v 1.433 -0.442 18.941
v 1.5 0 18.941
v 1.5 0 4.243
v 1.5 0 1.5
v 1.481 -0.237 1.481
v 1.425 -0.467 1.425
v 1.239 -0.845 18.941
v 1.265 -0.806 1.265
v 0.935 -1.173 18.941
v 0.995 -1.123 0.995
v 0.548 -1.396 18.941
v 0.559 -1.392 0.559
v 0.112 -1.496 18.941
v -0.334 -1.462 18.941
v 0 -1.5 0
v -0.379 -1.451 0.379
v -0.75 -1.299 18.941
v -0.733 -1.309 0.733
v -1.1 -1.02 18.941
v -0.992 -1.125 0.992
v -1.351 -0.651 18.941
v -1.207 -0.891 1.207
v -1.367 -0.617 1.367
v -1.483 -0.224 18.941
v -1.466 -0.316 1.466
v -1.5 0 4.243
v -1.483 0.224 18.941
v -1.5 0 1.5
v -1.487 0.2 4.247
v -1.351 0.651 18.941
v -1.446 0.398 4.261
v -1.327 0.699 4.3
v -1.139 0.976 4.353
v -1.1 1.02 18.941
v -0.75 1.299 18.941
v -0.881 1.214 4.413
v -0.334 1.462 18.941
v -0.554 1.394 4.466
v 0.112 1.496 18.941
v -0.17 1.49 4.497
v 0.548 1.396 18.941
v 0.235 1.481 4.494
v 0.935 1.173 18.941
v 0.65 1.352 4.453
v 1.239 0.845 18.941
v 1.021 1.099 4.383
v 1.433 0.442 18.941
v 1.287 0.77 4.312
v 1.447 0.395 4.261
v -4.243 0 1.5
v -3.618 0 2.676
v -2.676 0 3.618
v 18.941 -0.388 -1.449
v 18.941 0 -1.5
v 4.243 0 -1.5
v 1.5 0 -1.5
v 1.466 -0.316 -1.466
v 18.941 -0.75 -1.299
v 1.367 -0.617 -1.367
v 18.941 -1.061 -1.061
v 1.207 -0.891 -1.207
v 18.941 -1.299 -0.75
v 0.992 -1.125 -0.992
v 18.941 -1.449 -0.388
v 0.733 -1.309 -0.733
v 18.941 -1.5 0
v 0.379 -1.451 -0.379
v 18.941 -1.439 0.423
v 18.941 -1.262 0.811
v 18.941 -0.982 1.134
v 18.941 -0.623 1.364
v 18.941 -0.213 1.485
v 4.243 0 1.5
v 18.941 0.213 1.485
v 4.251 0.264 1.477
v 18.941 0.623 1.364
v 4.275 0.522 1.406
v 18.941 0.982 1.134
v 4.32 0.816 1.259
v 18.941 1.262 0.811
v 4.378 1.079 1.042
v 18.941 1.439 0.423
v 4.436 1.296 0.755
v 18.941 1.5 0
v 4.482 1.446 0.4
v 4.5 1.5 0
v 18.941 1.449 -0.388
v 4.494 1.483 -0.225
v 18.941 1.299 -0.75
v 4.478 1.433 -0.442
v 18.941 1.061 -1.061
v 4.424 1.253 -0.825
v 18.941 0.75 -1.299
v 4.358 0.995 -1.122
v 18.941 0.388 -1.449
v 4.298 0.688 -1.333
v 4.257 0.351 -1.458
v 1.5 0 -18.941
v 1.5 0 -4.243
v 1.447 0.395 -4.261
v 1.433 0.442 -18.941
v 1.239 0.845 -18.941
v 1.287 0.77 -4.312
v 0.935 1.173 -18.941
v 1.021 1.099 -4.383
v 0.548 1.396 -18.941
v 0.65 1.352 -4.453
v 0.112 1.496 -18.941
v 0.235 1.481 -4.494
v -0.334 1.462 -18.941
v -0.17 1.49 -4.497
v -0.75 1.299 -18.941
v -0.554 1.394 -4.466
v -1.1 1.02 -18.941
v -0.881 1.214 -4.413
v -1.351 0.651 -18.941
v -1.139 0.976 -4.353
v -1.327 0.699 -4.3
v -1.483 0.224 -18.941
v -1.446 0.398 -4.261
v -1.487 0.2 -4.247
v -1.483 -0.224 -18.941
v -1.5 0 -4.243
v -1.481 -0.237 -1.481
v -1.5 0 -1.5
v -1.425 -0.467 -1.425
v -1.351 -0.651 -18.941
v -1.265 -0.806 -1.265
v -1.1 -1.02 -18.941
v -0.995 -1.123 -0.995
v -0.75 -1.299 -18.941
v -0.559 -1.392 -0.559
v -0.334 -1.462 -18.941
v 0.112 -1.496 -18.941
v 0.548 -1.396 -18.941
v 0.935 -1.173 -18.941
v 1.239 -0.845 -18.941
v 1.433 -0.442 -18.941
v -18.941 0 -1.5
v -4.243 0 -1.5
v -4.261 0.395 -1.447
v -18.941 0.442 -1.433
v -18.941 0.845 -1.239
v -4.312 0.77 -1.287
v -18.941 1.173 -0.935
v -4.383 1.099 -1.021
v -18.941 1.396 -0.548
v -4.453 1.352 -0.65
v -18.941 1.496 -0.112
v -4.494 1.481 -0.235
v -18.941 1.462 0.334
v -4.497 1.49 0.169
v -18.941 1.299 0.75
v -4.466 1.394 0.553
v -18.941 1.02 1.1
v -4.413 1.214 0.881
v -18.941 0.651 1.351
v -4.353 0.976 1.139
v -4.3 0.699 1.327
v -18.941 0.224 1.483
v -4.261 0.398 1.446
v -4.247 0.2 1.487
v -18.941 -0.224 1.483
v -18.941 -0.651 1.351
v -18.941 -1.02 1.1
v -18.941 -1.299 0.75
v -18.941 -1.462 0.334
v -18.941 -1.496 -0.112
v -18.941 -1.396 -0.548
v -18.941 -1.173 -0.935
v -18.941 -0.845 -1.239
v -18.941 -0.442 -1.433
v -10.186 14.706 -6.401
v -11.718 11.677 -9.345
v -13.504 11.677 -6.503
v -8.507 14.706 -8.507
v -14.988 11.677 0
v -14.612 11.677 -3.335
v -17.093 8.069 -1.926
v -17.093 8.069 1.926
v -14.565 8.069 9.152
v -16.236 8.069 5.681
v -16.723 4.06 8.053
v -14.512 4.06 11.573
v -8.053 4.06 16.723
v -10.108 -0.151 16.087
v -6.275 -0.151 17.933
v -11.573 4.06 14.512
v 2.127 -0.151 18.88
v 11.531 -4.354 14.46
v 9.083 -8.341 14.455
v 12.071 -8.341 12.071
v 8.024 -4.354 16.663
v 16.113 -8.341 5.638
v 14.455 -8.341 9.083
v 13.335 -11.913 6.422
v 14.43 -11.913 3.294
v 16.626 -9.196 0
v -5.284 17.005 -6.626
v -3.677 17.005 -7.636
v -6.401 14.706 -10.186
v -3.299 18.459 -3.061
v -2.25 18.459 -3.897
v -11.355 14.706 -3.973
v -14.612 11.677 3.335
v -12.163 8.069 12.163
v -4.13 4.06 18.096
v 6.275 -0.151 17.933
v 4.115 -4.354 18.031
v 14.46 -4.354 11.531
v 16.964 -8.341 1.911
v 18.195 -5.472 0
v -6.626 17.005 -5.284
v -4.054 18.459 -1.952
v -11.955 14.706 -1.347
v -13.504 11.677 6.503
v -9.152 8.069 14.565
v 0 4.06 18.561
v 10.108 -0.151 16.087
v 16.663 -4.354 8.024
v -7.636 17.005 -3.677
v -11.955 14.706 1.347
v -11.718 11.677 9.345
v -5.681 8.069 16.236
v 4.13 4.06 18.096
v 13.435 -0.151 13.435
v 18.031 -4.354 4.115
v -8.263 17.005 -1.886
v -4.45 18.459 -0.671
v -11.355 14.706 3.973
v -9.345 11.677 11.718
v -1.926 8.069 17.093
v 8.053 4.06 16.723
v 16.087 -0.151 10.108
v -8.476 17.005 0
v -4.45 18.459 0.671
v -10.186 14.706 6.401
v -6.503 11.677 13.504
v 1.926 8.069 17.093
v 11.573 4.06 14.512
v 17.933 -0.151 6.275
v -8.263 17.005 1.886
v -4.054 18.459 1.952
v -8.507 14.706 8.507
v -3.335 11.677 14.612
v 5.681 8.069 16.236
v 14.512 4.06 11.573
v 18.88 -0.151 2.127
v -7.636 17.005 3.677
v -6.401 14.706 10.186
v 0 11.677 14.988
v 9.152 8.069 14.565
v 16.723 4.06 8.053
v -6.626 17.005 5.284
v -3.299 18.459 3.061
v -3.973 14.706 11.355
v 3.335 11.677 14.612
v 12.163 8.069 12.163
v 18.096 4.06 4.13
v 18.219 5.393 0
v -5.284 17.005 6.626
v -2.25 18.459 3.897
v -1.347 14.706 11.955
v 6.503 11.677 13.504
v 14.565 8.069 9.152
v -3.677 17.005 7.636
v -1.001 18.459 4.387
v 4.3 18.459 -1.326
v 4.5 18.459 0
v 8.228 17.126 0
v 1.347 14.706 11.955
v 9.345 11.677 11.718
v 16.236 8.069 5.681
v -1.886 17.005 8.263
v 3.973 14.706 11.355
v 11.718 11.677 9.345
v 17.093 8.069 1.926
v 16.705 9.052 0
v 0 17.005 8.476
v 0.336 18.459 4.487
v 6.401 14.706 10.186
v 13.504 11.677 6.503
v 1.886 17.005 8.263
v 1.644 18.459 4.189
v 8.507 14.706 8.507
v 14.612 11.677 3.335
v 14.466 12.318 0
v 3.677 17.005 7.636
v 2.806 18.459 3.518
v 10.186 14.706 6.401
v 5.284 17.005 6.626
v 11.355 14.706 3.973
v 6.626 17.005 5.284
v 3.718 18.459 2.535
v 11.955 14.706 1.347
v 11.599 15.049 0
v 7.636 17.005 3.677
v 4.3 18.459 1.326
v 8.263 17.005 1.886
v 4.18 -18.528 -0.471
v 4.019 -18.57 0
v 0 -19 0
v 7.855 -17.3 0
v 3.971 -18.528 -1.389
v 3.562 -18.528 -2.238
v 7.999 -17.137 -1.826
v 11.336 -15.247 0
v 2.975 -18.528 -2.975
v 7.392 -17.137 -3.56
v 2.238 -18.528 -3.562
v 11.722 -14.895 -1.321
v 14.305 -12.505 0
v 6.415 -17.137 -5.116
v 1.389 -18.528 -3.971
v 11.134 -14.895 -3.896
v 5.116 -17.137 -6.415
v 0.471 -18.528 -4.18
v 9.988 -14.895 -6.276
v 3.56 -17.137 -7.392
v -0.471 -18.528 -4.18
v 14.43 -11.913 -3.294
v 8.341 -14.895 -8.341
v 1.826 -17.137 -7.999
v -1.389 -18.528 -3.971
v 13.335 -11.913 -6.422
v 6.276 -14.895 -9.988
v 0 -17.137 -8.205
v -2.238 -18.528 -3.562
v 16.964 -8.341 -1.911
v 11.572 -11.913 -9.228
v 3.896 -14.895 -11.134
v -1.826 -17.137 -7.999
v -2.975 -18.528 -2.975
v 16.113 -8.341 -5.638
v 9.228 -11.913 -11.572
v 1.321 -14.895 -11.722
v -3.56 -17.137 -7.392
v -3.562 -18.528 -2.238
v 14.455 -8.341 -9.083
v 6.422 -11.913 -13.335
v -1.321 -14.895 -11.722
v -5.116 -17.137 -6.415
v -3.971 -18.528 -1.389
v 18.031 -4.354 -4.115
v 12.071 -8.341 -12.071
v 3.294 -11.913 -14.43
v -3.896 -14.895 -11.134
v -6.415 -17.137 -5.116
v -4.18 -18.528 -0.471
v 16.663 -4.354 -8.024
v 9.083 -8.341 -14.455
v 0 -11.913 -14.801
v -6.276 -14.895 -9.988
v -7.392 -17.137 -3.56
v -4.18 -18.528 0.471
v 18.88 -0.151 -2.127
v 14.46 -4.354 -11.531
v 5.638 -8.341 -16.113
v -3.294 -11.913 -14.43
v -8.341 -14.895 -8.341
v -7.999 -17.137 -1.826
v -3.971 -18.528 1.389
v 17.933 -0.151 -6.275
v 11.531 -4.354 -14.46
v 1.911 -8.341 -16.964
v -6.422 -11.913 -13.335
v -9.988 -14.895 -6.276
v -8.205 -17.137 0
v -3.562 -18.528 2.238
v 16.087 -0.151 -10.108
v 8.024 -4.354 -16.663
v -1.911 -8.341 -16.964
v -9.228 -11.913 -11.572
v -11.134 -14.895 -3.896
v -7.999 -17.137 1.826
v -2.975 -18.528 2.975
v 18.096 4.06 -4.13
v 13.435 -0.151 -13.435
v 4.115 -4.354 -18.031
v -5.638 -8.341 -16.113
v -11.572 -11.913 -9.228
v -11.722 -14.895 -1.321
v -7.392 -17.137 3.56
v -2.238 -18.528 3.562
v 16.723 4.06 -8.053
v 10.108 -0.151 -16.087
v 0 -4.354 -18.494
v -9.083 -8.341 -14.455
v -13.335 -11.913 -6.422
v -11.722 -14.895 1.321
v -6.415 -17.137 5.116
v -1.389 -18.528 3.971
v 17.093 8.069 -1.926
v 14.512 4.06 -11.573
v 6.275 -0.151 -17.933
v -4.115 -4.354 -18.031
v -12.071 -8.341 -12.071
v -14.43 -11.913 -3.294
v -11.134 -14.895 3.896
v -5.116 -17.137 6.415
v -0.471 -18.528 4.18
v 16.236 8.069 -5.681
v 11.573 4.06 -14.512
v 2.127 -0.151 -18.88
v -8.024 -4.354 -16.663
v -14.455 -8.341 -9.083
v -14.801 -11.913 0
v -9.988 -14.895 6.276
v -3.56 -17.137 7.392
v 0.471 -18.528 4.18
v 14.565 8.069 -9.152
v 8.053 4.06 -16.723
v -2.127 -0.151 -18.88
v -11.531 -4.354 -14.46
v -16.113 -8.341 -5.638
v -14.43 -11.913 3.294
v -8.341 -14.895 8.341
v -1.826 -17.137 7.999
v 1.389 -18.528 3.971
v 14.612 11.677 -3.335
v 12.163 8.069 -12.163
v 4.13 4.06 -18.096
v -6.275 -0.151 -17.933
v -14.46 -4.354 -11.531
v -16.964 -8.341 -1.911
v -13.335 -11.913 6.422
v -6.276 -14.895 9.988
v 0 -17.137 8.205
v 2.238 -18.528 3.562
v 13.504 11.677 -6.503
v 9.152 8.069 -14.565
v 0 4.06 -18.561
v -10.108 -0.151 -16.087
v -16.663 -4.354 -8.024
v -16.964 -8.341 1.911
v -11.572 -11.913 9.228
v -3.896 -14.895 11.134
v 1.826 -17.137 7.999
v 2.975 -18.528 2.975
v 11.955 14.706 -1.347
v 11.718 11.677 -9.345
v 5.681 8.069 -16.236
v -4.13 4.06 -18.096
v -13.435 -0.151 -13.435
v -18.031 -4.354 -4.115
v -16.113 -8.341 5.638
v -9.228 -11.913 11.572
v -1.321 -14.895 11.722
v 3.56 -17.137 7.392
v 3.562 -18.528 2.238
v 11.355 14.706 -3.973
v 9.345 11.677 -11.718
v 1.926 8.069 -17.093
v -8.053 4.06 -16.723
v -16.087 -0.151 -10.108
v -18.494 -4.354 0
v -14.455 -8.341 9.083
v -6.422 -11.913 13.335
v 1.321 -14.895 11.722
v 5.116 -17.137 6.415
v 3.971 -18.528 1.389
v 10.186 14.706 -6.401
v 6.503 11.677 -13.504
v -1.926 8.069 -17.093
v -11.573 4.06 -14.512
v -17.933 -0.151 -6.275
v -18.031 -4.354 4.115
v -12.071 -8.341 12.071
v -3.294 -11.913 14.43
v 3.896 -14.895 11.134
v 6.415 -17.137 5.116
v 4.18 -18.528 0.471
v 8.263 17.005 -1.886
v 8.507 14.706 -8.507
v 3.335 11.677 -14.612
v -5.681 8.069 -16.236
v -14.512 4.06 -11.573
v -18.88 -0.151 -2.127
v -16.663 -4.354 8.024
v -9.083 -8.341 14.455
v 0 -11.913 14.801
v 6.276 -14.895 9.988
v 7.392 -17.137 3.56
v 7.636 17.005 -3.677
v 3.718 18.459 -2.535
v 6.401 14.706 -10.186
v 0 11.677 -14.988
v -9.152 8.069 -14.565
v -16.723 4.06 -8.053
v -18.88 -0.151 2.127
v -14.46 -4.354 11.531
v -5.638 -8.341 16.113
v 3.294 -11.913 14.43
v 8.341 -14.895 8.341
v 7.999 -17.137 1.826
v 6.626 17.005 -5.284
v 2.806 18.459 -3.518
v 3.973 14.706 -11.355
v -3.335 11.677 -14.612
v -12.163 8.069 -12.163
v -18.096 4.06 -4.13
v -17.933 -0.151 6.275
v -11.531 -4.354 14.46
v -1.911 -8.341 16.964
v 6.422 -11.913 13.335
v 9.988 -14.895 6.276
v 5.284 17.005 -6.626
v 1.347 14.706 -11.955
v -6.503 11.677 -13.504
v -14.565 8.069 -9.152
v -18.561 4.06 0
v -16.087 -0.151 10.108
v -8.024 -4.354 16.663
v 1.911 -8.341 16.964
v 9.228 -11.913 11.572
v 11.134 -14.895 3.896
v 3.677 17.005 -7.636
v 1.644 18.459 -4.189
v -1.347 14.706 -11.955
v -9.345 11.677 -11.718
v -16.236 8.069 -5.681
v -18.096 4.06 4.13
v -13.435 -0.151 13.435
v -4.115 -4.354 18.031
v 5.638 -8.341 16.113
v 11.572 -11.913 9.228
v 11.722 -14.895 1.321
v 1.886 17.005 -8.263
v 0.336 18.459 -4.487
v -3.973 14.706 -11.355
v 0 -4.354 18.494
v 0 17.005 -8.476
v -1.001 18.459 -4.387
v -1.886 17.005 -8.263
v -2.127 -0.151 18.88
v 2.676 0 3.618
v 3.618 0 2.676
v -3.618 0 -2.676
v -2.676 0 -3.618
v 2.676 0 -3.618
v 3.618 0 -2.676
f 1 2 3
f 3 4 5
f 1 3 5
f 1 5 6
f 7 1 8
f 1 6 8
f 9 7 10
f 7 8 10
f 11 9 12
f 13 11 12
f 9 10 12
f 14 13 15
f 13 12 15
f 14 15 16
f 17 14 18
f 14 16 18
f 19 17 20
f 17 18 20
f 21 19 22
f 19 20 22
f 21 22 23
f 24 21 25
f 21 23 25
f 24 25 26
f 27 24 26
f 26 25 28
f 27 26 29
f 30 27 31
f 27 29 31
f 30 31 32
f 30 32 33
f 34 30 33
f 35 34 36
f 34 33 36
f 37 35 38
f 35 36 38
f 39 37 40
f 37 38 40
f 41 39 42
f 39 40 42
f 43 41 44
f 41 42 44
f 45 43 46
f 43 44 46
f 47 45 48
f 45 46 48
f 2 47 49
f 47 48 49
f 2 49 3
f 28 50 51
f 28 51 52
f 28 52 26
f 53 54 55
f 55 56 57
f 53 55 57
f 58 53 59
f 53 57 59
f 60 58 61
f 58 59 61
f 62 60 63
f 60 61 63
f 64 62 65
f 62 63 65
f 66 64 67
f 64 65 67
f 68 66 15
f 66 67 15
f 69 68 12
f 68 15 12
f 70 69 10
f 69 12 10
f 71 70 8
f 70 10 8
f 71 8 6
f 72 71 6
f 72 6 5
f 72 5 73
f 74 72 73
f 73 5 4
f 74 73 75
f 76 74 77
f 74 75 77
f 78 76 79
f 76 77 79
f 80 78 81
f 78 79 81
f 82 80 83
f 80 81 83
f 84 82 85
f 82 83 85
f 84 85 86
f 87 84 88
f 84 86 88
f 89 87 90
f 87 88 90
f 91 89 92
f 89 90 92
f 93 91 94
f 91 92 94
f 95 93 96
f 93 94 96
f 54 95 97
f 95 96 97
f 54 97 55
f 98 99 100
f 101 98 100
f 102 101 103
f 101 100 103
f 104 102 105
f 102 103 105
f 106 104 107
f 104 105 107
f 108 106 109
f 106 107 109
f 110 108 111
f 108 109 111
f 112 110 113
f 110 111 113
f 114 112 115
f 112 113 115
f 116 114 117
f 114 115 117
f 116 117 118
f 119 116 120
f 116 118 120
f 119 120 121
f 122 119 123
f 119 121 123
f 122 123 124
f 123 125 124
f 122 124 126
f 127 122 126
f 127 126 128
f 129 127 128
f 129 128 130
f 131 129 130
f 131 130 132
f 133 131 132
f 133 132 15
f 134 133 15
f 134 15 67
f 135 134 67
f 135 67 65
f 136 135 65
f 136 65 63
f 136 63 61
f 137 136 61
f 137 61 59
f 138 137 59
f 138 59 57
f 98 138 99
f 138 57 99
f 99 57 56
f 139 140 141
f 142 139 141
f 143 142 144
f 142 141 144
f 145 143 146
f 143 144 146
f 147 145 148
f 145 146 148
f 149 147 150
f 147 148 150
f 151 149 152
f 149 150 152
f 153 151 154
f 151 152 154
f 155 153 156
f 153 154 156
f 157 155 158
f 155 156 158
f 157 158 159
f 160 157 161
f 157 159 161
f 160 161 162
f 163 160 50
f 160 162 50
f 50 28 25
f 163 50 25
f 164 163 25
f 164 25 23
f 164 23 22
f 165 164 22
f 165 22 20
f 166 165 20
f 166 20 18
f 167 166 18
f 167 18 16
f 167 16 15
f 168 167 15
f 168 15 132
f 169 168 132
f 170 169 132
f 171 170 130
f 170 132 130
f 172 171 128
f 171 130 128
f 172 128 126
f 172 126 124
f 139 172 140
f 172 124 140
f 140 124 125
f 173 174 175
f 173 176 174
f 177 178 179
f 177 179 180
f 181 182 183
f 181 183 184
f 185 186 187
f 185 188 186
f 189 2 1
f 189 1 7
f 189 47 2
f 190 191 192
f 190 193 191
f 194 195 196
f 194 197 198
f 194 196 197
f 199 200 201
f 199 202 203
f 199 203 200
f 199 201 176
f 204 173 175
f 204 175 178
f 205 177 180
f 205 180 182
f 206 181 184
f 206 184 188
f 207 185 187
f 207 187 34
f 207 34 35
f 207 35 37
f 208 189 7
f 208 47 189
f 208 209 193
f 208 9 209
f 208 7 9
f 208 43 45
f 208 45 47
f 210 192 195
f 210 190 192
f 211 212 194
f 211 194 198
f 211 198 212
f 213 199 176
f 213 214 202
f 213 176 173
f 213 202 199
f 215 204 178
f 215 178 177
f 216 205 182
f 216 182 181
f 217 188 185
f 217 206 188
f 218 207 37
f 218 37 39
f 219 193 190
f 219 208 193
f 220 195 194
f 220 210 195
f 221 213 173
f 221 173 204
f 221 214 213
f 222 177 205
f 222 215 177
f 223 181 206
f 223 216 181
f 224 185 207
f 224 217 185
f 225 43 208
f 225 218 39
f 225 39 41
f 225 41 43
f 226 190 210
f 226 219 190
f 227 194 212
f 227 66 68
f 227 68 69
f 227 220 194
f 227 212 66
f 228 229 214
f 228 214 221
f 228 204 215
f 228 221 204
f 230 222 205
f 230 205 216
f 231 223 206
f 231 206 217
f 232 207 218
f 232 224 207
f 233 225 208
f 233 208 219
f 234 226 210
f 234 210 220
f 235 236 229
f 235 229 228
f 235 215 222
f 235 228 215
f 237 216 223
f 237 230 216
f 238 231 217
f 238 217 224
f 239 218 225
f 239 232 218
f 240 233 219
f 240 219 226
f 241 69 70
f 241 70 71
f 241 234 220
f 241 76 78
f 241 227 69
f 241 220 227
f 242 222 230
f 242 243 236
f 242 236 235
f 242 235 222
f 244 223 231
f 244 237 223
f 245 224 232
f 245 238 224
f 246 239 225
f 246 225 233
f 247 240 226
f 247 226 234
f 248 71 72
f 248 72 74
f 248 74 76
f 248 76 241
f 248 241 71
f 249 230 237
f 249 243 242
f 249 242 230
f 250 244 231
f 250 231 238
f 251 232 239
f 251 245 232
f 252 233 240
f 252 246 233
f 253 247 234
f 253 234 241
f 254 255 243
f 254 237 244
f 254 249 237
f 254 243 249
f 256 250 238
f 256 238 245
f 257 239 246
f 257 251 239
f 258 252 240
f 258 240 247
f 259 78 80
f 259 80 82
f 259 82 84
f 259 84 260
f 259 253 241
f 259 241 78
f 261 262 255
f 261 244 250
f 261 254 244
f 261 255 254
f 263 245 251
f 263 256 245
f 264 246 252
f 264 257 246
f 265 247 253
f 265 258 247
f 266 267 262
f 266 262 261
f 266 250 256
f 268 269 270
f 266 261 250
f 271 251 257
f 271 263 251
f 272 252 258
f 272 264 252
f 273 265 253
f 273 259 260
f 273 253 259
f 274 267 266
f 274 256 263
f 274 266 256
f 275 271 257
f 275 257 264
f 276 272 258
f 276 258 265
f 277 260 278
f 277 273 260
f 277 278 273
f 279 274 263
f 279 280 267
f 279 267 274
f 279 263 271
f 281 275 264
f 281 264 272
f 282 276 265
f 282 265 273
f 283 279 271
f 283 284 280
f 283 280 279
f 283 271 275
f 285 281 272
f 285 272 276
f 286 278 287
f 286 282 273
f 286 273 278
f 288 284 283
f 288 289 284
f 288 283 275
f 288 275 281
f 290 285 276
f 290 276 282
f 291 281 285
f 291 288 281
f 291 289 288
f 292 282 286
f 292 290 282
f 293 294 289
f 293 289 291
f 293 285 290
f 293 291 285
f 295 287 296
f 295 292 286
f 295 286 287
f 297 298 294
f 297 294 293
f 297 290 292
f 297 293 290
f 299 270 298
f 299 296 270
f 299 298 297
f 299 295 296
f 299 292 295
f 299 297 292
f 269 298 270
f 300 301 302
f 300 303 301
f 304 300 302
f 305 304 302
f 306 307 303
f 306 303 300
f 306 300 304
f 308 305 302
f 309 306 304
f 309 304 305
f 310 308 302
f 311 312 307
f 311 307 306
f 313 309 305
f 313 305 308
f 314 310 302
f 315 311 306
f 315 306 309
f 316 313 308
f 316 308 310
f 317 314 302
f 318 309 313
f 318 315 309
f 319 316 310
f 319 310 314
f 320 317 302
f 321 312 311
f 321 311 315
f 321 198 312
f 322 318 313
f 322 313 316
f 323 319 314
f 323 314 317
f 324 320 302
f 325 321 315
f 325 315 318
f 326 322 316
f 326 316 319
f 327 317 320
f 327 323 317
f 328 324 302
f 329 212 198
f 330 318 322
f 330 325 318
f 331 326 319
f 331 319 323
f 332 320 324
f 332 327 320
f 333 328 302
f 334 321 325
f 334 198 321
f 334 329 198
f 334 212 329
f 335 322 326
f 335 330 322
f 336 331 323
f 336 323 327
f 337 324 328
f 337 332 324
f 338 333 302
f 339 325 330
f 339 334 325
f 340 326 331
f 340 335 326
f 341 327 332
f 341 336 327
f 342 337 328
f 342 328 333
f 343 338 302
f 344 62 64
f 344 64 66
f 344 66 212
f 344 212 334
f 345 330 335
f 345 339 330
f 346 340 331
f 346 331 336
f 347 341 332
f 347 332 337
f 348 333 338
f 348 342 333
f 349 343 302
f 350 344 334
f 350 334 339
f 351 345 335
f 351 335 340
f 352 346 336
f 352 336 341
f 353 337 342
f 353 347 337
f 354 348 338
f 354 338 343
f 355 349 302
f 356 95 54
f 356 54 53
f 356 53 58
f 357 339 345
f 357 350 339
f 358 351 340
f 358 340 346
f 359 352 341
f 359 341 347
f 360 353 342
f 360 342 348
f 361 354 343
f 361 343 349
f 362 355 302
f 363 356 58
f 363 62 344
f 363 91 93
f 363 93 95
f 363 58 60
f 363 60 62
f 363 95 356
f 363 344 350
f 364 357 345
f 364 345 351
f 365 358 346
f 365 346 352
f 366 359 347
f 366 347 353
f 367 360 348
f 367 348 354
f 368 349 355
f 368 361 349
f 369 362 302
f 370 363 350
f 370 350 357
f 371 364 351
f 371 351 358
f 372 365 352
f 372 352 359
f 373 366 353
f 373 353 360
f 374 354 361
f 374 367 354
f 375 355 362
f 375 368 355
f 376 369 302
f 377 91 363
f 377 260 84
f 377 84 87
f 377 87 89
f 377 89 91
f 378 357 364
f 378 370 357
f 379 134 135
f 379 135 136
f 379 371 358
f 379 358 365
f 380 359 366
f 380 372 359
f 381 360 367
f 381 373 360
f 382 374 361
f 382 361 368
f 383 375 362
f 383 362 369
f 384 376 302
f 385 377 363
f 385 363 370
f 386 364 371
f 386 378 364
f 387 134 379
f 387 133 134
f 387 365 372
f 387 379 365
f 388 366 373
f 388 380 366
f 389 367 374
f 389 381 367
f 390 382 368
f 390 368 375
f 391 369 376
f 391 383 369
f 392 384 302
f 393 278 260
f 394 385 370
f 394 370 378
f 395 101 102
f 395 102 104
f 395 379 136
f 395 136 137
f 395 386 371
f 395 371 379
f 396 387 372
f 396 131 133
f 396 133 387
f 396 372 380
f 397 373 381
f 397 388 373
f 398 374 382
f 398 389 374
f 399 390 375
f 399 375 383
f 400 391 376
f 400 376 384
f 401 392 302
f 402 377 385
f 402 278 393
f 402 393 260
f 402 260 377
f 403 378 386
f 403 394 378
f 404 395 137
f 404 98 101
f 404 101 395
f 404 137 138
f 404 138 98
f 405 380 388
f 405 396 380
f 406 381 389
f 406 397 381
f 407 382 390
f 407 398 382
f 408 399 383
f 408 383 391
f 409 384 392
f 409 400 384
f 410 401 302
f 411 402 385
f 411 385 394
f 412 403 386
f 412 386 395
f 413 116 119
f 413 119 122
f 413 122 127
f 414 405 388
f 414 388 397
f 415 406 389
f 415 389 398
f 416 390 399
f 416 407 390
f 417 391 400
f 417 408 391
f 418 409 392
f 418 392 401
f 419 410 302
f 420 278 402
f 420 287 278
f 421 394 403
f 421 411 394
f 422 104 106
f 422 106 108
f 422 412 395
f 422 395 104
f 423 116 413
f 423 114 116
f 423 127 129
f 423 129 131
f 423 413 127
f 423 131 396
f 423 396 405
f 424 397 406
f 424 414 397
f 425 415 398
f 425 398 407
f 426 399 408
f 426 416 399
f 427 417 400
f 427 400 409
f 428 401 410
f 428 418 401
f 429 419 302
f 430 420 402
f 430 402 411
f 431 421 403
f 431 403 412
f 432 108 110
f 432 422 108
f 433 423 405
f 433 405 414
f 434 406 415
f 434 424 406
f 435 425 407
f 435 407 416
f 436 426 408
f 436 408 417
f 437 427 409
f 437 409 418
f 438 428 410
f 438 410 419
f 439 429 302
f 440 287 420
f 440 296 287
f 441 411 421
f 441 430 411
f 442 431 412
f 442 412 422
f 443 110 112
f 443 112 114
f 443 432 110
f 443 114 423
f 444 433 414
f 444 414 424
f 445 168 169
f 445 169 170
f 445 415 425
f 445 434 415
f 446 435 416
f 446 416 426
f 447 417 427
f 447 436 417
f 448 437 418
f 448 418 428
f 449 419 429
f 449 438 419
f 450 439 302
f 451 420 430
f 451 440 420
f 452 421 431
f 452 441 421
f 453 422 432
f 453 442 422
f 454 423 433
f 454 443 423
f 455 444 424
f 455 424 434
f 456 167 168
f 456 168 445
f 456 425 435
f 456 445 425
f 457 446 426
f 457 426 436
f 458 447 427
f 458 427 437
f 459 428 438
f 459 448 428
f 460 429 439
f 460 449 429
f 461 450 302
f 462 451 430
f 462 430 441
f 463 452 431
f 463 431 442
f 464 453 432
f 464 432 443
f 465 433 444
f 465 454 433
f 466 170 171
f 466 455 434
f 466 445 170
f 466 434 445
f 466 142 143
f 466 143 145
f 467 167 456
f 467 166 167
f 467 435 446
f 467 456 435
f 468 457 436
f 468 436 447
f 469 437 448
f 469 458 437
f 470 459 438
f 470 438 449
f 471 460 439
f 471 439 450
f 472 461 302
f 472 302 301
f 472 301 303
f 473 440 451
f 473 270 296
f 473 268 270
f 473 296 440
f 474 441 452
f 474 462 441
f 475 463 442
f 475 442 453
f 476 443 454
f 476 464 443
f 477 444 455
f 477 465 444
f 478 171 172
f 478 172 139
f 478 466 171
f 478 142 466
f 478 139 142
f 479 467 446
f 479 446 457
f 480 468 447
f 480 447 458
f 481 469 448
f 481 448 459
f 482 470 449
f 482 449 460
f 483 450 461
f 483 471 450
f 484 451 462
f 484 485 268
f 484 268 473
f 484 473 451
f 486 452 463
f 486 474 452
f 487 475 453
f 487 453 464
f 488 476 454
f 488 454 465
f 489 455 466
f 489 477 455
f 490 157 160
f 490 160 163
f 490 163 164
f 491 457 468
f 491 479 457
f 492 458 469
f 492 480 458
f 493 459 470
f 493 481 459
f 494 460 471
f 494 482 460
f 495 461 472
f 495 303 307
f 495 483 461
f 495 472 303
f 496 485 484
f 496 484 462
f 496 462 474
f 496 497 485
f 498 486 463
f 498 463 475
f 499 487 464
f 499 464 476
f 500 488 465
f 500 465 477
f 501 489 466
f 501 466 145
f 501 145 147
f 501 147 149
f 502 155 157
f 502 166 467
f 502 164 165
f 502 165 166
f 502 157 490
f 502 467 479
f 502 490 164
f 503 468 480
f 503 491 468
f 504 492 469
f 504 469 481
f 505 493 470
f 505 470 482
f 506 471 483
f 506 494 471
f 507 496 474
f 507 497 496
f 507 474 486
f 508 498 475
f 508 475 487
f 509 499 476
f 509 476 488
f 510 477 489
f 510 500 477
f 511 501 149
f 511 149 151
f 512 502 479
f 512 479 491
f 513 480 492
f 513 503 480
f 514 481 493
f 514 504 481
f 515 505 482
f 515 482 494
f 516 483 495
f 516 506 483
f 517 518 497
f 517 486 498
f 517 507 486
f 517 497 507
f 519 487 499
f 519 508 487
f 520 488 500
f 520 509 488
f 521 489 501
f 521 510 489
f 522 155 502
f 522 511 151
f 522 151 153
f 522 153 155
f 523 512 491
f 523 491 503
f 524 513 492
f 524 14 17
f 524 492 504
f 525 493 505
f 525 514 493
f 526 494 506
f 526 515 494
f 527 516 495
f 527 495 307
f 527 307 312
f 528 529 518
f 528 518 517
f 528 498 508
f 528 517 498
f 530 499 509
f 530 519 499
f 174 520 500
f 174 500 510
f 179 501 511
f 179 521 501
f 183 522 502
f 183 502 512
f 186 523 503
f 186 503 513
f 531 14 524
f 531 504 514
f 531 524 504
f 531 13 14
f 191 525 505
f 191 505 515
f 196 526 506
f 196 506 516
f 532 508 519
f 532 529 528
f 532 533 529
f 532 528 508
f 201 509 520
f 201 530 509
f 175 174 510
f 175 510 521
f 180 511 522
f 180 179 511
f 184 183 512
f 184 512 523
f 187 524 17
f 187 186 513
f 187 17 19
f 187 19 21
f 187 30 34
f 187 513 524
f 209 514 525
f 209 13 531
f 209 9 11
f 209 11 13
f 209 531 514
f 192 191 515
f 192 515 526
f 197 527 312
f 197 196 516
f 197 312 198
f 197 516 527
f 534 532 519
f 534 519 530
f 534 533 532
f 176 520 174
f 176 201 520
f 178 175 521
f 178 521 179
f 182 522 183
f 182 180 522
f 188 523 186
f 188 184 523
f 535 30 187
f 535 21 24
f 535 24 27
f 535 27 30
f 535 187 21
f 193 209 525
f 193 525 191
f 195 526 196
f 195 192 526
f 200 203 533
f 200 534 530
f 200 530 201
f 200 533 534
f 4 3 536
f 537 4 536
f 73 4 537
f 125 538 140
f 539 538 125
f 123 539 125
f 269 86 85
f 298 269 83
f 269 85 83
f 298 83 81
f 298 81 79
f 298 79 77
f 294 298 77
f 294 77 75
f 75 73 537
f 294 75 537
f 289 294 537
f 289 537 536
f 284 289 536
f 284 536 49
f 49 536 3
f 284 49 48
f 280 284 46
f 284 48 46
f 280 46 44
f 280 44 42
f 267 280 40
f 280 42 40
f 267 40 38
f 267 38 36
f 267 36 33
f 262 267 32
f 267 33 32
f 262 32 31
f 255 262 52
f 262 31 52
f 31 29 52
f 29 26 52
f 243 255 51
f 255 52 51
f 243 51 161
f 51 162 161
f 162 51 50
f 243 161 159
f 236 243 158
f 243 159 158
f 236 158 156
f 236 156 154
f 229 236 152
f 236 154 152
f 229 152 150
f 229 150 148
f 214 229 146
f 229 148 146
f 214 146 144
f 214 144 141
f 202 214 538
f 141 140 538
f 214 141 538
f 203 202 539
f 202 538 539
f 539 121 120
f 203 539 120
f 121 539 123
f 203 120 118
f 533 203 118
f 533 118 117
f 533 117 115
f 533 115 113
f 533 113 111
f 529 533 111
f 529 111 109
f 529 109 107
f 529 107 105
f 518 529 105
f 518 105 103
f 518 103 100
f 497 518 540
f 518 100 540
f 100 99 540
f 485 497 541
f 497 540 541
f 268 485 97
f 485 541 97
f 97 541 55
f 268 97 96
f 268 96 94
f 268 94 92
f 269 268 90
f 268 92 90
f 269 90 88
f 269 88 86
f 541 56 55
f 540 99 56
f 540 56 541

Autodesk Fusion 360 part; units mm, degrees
sphere "SpherePrimitive1" add diameter 38 placed x (1, 0, 0) y (0, 0, -1) z (0, 1, 0) at (0, 0, 0)
sketch "Sketch2" plane through (0, 0, 0) normal (1, 0, 0) x (0, 0, -1)
  circle A0 centre (0, 0) radius 1.5
  dimension "d2" = 3
sketch "Sketch3" plane through (0, 0, 0) normal (0, 0, 1) x (1, 0, 0)
  circle A0 centre (0, 0) radius 1.5
  dimension "d3" = 3
sketch "Sketch4" plane through (0, 0, 0) normal (0, 1, 0) x (1, 0, 0)
  circle A0 centre (0, 0) radius 4.5
  dimension "d4" = 9
extrude "Extrude1" cut sketch "Sketch4" along normal blind 50
extrude "Extrude2" cut sketch "Sketch2" along normal mid plane 100
extrude "Extrude3" cut sketch "Sketch3" along normal mid plane 120
